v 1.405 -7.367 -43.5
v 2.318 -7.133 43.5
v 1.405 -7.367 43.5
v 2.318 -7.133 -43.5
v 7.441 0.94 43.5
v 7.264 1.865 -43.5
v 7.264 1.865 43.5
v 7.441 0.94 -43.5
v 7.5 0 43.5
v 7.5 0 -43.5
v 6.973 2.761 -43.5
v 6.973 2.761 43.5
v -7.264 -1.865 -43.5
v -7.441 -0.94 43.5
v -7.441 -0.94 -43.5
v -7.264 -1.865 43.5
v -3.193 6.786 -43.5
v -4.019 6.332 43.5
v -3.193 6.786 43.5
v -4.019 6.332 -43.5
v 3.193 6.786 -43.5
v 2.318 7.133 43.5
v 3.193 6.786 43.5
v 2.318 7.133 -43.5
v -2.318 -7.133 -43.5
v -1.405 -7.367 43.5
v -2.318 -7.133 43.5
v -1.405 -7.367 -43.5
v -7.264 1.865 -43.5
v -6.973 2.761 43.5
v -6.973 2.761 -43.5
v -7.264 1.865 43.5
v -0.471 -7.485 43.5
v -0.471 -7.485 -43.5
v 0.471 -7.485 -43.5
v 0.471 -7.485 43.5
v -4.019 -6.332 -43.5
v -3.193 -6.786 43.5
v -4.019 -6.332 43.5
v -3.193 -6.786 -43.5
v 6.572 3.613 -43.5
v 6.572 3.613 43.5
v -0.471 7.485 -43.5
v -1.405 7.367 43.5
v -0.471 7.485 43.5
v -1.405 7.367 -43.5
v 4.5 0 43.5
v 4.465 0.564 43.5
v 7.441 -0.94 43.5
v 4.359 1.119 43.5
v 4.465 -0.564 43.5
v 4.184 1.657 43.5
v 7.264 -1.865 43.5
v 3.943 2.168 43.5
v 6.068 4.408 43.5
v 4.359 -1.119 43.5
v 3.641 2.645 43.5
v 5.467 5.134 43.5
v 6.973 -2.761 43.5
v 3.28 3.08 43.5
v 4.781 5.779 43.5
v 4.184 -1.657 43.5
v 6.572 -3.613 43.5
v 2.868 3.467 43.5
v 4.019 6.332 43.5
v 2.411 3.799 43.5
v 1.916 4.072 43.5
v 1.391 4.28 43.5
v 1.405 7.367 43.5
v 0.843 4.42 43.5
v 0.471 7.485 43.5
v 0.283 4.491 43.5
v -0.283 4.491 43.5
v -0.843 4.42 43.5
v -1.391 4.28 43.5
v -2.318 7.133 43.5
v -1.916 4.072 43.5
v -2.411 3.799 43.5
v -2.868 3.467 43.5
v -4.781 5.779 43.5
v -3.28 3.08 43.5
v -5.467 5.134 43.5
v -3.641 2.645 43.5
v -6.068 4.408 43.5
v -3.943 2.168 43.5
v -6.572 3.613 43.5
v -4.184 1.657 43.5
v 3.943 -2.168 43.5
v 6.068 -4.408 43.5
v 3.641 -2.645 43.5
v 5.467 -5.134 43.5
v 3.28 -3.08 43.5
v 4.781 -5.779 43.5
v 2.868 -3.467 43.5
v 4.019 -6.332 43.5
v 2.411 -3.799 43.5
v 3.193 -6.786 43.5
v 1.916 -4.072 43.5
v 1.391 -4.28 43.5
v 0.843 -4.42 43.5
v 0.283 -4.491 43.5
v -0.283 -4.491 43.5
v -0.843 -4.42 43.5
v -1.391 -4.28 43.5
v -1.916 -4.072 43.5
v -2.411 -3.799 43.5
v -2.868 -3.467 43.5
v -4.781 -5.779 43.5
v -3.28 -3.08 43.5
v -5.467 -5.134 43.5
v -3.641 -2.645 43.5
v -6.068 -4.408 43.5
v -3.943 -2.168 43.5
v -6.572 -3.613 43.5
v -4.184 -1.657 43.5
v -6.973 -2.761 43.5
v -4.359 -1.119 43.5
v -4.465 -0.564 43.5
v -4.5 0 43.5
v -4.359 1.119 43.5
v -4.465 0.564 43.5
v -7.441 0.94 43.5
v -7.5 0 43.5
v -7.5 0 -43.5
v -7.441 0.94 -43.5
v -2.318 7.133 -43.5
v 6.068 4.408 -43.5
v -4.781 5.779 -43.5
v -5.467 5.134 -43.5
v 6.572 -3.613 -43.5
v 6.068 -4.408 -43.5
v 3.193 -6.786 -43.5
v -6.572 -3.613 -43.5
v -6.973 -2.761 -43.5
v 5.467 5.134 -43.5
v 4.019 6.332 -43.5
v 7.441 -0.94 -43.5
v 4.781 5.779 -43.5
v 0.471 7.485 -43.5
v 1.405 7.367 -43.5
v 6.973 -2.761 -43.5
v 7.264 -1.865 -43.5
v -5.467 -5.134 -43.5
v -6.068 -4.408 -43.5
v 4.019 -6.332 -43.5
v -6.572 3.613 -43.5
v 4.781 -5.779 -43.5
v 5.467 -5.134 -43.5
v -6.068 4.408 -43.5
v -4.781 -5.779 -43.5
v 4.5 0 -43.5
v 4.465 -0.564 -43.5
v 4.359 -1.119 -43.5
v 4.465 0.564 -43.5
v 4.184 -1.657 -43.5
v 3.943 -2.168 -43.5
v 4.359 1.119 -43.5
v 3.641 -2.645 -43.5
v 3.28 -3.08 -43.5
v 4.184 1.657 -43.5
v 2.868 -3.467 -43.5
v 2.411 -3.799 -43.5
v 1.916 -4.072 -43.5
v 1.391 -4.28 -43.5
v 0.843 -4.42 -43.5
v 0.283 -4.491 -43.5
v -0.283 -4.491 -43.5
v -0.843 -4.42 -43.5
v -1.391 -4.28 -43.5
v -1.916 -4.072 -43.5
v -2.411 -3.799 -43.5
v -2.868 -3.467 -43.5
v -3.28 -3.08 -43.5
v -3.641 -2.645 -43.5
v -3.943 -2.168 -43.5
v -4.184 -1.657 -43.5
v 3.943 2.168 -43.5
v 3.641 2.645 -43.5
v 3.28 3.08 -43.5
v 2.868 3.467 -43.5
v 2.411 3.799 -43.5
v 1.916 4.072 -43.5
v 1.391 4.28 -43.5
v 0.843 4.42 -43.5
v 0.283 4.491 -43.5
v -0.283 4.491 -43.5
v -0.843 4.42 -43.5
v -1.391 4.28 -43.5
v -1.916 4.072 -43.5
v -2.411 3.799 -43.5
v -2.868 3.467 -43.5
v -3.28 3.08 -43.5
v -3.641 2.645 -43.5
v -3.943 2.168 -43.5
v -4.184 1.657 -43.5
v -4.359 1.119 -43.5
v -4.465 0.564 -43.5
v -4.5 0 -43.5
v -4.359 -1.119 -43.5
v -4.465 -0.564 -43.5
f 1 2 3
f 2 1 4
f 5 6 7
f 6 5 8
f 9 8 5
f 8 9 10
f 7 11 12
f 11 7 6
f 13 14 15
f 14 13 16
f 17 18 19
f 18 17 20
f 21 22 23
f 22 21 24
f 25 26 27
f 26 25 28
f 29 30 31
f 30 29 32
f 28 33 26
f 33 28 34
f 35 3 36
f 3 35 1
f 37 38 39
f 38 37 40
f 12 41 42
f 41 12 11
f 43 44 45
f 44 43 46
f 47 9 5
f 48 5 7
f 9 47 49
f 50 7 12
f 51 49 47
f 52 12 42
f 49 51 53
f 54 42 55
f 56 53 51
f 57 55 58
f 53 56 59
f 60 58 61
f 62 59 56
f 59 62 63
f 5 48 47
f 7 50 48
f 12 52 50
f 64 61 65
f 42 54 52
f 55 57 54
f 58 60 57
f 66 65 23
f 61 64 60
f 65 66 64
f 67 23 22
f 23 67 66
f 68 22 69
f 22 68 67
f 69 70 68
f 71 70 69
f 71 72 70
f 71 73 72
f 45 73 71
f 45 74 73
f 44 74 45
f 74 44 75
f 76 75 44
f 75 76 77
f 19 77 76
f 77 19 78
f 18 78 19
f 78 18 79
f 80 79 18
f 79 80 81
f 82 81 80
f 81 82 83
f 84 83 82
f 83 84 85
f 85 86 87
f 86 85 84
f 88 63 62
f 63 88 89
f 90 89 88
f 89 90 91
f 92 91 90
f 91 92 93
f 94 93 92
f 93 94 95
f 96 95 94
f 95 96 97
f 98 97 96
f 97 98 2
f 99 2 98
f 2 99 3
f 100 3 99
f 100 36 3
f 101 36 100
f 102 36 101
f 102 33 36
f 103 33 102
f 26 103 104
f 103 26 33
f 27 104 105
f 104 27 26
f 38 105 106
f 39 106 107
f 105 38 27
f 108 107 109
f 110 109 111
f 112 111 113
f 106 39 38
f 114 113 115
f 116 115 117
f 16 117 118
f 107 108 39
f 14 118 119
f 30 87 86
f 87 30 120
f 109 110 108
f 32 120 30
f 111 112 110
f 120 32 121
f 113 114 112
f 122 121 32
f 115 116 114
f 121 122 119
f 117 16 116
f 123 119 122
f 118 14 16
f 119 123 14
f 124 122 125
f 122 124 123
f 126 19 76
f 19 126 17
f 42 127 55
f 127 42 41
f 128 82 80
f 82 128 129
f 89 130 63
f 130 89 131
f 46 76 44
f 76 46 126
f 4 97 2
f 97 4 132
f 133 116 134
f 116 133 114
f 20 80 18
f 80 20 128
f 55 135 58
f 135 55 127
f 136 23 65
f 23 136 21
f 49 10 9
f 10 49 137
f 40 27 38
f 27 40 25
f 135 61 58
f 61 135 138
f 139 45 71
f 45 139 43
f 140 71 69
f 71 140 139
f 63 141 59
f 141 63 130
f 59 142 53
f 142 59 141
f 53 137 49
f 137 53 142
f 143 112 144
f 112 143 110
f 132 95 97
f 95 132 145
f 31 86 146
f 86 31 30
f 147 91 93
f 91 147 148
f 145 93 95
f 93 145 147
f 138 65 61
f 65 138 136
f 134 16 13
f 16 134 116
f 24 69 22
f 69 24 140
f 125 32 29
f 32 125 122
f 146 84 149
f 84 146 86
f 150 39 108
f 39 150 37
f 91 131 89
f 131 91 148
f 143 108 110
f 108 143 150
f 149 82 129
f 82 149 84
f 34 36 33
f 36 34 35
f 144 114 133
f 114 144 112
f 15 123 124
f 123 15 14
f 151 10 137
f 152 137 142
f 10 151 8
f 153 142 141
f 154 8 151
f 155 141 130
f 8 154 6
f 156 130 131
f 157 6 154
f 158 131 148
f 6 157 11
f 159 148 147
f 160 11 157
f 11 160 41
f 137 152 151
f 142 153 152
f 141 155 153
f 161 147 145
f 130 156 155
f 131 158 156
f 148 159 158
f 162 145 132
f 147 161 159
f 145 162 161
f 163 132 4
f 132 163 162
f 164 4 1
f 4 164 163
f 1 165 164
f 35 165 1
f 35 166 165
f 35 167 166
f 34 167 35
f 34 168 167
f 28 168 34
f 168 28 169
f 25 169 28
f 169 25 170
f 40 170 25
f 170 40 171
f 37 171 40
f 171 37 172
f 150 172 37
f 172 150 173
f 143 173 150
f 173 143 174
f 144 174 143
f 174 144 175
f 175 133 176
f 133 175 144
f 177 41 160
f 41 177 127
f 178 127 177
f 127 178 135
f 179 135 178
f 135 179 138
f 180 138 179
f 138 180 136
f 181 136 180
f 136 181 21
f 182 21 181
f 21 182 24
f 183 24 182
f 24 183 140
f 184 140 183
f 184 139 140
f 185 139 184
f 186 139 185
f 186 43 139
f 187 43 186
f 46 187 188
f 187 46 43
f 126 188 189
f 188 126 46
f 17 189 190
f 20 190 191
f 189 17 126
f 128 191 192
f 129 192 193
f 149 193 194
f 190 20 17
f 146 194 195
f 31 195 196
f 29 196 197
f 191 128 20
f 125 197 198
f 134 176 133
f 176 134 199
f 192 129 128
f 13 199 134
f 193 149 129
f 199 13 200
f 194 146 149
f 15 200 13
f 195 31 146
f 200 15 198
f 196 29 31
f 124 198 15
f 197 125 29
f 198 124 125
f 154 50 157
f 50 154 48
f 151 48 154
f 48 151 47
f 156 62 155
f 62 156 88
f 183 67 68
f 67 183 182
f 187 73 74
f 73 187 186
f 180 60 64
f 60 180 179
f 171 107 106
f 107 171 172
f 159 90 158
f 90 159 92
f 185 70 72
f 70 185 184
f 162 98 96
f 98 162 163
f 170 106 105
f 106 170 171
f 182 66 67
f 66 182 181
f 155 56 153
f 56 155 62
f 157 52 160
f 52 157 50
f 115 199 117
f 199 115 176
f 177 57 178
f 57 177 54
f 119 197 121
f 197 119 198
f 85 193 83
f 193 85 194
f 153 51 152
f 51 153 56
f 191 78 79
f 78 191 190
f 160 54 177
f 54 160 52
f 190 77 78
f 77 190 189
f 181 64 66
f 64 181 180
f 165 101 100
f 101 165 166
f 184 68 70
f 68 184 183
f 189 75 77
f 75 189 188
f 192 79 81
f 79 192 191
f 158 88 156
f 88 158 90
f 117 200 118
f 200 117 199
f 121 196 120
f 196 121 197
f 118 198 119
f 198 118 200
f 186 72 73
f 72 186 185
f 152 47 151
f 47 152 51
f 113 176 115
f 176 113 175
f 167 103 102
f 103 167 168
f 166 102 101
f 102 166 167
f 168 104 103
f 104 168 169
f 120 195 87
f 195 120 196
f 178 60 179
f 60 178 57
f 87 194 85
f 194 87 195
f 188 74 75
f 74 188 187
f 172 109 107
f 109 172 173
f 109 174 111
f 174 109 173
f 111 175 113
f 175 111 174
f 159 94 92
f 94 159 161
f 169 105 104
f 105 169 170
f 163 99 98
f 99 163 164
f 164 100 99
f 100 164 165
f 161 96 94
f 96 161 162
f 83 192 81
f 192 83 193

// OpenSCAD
$fn = 50;


difference() {
	union() {
		translate(v = [0, 0, -43.5000000000]) {
			cylinder(h = 87, r = 7.5000000000);
		}
	}
	union() {
		translate(v = [0, 0, -100.0000000000]) {
			cylinder(h = 200, r = 4.5000000000);
		}
	}
}
